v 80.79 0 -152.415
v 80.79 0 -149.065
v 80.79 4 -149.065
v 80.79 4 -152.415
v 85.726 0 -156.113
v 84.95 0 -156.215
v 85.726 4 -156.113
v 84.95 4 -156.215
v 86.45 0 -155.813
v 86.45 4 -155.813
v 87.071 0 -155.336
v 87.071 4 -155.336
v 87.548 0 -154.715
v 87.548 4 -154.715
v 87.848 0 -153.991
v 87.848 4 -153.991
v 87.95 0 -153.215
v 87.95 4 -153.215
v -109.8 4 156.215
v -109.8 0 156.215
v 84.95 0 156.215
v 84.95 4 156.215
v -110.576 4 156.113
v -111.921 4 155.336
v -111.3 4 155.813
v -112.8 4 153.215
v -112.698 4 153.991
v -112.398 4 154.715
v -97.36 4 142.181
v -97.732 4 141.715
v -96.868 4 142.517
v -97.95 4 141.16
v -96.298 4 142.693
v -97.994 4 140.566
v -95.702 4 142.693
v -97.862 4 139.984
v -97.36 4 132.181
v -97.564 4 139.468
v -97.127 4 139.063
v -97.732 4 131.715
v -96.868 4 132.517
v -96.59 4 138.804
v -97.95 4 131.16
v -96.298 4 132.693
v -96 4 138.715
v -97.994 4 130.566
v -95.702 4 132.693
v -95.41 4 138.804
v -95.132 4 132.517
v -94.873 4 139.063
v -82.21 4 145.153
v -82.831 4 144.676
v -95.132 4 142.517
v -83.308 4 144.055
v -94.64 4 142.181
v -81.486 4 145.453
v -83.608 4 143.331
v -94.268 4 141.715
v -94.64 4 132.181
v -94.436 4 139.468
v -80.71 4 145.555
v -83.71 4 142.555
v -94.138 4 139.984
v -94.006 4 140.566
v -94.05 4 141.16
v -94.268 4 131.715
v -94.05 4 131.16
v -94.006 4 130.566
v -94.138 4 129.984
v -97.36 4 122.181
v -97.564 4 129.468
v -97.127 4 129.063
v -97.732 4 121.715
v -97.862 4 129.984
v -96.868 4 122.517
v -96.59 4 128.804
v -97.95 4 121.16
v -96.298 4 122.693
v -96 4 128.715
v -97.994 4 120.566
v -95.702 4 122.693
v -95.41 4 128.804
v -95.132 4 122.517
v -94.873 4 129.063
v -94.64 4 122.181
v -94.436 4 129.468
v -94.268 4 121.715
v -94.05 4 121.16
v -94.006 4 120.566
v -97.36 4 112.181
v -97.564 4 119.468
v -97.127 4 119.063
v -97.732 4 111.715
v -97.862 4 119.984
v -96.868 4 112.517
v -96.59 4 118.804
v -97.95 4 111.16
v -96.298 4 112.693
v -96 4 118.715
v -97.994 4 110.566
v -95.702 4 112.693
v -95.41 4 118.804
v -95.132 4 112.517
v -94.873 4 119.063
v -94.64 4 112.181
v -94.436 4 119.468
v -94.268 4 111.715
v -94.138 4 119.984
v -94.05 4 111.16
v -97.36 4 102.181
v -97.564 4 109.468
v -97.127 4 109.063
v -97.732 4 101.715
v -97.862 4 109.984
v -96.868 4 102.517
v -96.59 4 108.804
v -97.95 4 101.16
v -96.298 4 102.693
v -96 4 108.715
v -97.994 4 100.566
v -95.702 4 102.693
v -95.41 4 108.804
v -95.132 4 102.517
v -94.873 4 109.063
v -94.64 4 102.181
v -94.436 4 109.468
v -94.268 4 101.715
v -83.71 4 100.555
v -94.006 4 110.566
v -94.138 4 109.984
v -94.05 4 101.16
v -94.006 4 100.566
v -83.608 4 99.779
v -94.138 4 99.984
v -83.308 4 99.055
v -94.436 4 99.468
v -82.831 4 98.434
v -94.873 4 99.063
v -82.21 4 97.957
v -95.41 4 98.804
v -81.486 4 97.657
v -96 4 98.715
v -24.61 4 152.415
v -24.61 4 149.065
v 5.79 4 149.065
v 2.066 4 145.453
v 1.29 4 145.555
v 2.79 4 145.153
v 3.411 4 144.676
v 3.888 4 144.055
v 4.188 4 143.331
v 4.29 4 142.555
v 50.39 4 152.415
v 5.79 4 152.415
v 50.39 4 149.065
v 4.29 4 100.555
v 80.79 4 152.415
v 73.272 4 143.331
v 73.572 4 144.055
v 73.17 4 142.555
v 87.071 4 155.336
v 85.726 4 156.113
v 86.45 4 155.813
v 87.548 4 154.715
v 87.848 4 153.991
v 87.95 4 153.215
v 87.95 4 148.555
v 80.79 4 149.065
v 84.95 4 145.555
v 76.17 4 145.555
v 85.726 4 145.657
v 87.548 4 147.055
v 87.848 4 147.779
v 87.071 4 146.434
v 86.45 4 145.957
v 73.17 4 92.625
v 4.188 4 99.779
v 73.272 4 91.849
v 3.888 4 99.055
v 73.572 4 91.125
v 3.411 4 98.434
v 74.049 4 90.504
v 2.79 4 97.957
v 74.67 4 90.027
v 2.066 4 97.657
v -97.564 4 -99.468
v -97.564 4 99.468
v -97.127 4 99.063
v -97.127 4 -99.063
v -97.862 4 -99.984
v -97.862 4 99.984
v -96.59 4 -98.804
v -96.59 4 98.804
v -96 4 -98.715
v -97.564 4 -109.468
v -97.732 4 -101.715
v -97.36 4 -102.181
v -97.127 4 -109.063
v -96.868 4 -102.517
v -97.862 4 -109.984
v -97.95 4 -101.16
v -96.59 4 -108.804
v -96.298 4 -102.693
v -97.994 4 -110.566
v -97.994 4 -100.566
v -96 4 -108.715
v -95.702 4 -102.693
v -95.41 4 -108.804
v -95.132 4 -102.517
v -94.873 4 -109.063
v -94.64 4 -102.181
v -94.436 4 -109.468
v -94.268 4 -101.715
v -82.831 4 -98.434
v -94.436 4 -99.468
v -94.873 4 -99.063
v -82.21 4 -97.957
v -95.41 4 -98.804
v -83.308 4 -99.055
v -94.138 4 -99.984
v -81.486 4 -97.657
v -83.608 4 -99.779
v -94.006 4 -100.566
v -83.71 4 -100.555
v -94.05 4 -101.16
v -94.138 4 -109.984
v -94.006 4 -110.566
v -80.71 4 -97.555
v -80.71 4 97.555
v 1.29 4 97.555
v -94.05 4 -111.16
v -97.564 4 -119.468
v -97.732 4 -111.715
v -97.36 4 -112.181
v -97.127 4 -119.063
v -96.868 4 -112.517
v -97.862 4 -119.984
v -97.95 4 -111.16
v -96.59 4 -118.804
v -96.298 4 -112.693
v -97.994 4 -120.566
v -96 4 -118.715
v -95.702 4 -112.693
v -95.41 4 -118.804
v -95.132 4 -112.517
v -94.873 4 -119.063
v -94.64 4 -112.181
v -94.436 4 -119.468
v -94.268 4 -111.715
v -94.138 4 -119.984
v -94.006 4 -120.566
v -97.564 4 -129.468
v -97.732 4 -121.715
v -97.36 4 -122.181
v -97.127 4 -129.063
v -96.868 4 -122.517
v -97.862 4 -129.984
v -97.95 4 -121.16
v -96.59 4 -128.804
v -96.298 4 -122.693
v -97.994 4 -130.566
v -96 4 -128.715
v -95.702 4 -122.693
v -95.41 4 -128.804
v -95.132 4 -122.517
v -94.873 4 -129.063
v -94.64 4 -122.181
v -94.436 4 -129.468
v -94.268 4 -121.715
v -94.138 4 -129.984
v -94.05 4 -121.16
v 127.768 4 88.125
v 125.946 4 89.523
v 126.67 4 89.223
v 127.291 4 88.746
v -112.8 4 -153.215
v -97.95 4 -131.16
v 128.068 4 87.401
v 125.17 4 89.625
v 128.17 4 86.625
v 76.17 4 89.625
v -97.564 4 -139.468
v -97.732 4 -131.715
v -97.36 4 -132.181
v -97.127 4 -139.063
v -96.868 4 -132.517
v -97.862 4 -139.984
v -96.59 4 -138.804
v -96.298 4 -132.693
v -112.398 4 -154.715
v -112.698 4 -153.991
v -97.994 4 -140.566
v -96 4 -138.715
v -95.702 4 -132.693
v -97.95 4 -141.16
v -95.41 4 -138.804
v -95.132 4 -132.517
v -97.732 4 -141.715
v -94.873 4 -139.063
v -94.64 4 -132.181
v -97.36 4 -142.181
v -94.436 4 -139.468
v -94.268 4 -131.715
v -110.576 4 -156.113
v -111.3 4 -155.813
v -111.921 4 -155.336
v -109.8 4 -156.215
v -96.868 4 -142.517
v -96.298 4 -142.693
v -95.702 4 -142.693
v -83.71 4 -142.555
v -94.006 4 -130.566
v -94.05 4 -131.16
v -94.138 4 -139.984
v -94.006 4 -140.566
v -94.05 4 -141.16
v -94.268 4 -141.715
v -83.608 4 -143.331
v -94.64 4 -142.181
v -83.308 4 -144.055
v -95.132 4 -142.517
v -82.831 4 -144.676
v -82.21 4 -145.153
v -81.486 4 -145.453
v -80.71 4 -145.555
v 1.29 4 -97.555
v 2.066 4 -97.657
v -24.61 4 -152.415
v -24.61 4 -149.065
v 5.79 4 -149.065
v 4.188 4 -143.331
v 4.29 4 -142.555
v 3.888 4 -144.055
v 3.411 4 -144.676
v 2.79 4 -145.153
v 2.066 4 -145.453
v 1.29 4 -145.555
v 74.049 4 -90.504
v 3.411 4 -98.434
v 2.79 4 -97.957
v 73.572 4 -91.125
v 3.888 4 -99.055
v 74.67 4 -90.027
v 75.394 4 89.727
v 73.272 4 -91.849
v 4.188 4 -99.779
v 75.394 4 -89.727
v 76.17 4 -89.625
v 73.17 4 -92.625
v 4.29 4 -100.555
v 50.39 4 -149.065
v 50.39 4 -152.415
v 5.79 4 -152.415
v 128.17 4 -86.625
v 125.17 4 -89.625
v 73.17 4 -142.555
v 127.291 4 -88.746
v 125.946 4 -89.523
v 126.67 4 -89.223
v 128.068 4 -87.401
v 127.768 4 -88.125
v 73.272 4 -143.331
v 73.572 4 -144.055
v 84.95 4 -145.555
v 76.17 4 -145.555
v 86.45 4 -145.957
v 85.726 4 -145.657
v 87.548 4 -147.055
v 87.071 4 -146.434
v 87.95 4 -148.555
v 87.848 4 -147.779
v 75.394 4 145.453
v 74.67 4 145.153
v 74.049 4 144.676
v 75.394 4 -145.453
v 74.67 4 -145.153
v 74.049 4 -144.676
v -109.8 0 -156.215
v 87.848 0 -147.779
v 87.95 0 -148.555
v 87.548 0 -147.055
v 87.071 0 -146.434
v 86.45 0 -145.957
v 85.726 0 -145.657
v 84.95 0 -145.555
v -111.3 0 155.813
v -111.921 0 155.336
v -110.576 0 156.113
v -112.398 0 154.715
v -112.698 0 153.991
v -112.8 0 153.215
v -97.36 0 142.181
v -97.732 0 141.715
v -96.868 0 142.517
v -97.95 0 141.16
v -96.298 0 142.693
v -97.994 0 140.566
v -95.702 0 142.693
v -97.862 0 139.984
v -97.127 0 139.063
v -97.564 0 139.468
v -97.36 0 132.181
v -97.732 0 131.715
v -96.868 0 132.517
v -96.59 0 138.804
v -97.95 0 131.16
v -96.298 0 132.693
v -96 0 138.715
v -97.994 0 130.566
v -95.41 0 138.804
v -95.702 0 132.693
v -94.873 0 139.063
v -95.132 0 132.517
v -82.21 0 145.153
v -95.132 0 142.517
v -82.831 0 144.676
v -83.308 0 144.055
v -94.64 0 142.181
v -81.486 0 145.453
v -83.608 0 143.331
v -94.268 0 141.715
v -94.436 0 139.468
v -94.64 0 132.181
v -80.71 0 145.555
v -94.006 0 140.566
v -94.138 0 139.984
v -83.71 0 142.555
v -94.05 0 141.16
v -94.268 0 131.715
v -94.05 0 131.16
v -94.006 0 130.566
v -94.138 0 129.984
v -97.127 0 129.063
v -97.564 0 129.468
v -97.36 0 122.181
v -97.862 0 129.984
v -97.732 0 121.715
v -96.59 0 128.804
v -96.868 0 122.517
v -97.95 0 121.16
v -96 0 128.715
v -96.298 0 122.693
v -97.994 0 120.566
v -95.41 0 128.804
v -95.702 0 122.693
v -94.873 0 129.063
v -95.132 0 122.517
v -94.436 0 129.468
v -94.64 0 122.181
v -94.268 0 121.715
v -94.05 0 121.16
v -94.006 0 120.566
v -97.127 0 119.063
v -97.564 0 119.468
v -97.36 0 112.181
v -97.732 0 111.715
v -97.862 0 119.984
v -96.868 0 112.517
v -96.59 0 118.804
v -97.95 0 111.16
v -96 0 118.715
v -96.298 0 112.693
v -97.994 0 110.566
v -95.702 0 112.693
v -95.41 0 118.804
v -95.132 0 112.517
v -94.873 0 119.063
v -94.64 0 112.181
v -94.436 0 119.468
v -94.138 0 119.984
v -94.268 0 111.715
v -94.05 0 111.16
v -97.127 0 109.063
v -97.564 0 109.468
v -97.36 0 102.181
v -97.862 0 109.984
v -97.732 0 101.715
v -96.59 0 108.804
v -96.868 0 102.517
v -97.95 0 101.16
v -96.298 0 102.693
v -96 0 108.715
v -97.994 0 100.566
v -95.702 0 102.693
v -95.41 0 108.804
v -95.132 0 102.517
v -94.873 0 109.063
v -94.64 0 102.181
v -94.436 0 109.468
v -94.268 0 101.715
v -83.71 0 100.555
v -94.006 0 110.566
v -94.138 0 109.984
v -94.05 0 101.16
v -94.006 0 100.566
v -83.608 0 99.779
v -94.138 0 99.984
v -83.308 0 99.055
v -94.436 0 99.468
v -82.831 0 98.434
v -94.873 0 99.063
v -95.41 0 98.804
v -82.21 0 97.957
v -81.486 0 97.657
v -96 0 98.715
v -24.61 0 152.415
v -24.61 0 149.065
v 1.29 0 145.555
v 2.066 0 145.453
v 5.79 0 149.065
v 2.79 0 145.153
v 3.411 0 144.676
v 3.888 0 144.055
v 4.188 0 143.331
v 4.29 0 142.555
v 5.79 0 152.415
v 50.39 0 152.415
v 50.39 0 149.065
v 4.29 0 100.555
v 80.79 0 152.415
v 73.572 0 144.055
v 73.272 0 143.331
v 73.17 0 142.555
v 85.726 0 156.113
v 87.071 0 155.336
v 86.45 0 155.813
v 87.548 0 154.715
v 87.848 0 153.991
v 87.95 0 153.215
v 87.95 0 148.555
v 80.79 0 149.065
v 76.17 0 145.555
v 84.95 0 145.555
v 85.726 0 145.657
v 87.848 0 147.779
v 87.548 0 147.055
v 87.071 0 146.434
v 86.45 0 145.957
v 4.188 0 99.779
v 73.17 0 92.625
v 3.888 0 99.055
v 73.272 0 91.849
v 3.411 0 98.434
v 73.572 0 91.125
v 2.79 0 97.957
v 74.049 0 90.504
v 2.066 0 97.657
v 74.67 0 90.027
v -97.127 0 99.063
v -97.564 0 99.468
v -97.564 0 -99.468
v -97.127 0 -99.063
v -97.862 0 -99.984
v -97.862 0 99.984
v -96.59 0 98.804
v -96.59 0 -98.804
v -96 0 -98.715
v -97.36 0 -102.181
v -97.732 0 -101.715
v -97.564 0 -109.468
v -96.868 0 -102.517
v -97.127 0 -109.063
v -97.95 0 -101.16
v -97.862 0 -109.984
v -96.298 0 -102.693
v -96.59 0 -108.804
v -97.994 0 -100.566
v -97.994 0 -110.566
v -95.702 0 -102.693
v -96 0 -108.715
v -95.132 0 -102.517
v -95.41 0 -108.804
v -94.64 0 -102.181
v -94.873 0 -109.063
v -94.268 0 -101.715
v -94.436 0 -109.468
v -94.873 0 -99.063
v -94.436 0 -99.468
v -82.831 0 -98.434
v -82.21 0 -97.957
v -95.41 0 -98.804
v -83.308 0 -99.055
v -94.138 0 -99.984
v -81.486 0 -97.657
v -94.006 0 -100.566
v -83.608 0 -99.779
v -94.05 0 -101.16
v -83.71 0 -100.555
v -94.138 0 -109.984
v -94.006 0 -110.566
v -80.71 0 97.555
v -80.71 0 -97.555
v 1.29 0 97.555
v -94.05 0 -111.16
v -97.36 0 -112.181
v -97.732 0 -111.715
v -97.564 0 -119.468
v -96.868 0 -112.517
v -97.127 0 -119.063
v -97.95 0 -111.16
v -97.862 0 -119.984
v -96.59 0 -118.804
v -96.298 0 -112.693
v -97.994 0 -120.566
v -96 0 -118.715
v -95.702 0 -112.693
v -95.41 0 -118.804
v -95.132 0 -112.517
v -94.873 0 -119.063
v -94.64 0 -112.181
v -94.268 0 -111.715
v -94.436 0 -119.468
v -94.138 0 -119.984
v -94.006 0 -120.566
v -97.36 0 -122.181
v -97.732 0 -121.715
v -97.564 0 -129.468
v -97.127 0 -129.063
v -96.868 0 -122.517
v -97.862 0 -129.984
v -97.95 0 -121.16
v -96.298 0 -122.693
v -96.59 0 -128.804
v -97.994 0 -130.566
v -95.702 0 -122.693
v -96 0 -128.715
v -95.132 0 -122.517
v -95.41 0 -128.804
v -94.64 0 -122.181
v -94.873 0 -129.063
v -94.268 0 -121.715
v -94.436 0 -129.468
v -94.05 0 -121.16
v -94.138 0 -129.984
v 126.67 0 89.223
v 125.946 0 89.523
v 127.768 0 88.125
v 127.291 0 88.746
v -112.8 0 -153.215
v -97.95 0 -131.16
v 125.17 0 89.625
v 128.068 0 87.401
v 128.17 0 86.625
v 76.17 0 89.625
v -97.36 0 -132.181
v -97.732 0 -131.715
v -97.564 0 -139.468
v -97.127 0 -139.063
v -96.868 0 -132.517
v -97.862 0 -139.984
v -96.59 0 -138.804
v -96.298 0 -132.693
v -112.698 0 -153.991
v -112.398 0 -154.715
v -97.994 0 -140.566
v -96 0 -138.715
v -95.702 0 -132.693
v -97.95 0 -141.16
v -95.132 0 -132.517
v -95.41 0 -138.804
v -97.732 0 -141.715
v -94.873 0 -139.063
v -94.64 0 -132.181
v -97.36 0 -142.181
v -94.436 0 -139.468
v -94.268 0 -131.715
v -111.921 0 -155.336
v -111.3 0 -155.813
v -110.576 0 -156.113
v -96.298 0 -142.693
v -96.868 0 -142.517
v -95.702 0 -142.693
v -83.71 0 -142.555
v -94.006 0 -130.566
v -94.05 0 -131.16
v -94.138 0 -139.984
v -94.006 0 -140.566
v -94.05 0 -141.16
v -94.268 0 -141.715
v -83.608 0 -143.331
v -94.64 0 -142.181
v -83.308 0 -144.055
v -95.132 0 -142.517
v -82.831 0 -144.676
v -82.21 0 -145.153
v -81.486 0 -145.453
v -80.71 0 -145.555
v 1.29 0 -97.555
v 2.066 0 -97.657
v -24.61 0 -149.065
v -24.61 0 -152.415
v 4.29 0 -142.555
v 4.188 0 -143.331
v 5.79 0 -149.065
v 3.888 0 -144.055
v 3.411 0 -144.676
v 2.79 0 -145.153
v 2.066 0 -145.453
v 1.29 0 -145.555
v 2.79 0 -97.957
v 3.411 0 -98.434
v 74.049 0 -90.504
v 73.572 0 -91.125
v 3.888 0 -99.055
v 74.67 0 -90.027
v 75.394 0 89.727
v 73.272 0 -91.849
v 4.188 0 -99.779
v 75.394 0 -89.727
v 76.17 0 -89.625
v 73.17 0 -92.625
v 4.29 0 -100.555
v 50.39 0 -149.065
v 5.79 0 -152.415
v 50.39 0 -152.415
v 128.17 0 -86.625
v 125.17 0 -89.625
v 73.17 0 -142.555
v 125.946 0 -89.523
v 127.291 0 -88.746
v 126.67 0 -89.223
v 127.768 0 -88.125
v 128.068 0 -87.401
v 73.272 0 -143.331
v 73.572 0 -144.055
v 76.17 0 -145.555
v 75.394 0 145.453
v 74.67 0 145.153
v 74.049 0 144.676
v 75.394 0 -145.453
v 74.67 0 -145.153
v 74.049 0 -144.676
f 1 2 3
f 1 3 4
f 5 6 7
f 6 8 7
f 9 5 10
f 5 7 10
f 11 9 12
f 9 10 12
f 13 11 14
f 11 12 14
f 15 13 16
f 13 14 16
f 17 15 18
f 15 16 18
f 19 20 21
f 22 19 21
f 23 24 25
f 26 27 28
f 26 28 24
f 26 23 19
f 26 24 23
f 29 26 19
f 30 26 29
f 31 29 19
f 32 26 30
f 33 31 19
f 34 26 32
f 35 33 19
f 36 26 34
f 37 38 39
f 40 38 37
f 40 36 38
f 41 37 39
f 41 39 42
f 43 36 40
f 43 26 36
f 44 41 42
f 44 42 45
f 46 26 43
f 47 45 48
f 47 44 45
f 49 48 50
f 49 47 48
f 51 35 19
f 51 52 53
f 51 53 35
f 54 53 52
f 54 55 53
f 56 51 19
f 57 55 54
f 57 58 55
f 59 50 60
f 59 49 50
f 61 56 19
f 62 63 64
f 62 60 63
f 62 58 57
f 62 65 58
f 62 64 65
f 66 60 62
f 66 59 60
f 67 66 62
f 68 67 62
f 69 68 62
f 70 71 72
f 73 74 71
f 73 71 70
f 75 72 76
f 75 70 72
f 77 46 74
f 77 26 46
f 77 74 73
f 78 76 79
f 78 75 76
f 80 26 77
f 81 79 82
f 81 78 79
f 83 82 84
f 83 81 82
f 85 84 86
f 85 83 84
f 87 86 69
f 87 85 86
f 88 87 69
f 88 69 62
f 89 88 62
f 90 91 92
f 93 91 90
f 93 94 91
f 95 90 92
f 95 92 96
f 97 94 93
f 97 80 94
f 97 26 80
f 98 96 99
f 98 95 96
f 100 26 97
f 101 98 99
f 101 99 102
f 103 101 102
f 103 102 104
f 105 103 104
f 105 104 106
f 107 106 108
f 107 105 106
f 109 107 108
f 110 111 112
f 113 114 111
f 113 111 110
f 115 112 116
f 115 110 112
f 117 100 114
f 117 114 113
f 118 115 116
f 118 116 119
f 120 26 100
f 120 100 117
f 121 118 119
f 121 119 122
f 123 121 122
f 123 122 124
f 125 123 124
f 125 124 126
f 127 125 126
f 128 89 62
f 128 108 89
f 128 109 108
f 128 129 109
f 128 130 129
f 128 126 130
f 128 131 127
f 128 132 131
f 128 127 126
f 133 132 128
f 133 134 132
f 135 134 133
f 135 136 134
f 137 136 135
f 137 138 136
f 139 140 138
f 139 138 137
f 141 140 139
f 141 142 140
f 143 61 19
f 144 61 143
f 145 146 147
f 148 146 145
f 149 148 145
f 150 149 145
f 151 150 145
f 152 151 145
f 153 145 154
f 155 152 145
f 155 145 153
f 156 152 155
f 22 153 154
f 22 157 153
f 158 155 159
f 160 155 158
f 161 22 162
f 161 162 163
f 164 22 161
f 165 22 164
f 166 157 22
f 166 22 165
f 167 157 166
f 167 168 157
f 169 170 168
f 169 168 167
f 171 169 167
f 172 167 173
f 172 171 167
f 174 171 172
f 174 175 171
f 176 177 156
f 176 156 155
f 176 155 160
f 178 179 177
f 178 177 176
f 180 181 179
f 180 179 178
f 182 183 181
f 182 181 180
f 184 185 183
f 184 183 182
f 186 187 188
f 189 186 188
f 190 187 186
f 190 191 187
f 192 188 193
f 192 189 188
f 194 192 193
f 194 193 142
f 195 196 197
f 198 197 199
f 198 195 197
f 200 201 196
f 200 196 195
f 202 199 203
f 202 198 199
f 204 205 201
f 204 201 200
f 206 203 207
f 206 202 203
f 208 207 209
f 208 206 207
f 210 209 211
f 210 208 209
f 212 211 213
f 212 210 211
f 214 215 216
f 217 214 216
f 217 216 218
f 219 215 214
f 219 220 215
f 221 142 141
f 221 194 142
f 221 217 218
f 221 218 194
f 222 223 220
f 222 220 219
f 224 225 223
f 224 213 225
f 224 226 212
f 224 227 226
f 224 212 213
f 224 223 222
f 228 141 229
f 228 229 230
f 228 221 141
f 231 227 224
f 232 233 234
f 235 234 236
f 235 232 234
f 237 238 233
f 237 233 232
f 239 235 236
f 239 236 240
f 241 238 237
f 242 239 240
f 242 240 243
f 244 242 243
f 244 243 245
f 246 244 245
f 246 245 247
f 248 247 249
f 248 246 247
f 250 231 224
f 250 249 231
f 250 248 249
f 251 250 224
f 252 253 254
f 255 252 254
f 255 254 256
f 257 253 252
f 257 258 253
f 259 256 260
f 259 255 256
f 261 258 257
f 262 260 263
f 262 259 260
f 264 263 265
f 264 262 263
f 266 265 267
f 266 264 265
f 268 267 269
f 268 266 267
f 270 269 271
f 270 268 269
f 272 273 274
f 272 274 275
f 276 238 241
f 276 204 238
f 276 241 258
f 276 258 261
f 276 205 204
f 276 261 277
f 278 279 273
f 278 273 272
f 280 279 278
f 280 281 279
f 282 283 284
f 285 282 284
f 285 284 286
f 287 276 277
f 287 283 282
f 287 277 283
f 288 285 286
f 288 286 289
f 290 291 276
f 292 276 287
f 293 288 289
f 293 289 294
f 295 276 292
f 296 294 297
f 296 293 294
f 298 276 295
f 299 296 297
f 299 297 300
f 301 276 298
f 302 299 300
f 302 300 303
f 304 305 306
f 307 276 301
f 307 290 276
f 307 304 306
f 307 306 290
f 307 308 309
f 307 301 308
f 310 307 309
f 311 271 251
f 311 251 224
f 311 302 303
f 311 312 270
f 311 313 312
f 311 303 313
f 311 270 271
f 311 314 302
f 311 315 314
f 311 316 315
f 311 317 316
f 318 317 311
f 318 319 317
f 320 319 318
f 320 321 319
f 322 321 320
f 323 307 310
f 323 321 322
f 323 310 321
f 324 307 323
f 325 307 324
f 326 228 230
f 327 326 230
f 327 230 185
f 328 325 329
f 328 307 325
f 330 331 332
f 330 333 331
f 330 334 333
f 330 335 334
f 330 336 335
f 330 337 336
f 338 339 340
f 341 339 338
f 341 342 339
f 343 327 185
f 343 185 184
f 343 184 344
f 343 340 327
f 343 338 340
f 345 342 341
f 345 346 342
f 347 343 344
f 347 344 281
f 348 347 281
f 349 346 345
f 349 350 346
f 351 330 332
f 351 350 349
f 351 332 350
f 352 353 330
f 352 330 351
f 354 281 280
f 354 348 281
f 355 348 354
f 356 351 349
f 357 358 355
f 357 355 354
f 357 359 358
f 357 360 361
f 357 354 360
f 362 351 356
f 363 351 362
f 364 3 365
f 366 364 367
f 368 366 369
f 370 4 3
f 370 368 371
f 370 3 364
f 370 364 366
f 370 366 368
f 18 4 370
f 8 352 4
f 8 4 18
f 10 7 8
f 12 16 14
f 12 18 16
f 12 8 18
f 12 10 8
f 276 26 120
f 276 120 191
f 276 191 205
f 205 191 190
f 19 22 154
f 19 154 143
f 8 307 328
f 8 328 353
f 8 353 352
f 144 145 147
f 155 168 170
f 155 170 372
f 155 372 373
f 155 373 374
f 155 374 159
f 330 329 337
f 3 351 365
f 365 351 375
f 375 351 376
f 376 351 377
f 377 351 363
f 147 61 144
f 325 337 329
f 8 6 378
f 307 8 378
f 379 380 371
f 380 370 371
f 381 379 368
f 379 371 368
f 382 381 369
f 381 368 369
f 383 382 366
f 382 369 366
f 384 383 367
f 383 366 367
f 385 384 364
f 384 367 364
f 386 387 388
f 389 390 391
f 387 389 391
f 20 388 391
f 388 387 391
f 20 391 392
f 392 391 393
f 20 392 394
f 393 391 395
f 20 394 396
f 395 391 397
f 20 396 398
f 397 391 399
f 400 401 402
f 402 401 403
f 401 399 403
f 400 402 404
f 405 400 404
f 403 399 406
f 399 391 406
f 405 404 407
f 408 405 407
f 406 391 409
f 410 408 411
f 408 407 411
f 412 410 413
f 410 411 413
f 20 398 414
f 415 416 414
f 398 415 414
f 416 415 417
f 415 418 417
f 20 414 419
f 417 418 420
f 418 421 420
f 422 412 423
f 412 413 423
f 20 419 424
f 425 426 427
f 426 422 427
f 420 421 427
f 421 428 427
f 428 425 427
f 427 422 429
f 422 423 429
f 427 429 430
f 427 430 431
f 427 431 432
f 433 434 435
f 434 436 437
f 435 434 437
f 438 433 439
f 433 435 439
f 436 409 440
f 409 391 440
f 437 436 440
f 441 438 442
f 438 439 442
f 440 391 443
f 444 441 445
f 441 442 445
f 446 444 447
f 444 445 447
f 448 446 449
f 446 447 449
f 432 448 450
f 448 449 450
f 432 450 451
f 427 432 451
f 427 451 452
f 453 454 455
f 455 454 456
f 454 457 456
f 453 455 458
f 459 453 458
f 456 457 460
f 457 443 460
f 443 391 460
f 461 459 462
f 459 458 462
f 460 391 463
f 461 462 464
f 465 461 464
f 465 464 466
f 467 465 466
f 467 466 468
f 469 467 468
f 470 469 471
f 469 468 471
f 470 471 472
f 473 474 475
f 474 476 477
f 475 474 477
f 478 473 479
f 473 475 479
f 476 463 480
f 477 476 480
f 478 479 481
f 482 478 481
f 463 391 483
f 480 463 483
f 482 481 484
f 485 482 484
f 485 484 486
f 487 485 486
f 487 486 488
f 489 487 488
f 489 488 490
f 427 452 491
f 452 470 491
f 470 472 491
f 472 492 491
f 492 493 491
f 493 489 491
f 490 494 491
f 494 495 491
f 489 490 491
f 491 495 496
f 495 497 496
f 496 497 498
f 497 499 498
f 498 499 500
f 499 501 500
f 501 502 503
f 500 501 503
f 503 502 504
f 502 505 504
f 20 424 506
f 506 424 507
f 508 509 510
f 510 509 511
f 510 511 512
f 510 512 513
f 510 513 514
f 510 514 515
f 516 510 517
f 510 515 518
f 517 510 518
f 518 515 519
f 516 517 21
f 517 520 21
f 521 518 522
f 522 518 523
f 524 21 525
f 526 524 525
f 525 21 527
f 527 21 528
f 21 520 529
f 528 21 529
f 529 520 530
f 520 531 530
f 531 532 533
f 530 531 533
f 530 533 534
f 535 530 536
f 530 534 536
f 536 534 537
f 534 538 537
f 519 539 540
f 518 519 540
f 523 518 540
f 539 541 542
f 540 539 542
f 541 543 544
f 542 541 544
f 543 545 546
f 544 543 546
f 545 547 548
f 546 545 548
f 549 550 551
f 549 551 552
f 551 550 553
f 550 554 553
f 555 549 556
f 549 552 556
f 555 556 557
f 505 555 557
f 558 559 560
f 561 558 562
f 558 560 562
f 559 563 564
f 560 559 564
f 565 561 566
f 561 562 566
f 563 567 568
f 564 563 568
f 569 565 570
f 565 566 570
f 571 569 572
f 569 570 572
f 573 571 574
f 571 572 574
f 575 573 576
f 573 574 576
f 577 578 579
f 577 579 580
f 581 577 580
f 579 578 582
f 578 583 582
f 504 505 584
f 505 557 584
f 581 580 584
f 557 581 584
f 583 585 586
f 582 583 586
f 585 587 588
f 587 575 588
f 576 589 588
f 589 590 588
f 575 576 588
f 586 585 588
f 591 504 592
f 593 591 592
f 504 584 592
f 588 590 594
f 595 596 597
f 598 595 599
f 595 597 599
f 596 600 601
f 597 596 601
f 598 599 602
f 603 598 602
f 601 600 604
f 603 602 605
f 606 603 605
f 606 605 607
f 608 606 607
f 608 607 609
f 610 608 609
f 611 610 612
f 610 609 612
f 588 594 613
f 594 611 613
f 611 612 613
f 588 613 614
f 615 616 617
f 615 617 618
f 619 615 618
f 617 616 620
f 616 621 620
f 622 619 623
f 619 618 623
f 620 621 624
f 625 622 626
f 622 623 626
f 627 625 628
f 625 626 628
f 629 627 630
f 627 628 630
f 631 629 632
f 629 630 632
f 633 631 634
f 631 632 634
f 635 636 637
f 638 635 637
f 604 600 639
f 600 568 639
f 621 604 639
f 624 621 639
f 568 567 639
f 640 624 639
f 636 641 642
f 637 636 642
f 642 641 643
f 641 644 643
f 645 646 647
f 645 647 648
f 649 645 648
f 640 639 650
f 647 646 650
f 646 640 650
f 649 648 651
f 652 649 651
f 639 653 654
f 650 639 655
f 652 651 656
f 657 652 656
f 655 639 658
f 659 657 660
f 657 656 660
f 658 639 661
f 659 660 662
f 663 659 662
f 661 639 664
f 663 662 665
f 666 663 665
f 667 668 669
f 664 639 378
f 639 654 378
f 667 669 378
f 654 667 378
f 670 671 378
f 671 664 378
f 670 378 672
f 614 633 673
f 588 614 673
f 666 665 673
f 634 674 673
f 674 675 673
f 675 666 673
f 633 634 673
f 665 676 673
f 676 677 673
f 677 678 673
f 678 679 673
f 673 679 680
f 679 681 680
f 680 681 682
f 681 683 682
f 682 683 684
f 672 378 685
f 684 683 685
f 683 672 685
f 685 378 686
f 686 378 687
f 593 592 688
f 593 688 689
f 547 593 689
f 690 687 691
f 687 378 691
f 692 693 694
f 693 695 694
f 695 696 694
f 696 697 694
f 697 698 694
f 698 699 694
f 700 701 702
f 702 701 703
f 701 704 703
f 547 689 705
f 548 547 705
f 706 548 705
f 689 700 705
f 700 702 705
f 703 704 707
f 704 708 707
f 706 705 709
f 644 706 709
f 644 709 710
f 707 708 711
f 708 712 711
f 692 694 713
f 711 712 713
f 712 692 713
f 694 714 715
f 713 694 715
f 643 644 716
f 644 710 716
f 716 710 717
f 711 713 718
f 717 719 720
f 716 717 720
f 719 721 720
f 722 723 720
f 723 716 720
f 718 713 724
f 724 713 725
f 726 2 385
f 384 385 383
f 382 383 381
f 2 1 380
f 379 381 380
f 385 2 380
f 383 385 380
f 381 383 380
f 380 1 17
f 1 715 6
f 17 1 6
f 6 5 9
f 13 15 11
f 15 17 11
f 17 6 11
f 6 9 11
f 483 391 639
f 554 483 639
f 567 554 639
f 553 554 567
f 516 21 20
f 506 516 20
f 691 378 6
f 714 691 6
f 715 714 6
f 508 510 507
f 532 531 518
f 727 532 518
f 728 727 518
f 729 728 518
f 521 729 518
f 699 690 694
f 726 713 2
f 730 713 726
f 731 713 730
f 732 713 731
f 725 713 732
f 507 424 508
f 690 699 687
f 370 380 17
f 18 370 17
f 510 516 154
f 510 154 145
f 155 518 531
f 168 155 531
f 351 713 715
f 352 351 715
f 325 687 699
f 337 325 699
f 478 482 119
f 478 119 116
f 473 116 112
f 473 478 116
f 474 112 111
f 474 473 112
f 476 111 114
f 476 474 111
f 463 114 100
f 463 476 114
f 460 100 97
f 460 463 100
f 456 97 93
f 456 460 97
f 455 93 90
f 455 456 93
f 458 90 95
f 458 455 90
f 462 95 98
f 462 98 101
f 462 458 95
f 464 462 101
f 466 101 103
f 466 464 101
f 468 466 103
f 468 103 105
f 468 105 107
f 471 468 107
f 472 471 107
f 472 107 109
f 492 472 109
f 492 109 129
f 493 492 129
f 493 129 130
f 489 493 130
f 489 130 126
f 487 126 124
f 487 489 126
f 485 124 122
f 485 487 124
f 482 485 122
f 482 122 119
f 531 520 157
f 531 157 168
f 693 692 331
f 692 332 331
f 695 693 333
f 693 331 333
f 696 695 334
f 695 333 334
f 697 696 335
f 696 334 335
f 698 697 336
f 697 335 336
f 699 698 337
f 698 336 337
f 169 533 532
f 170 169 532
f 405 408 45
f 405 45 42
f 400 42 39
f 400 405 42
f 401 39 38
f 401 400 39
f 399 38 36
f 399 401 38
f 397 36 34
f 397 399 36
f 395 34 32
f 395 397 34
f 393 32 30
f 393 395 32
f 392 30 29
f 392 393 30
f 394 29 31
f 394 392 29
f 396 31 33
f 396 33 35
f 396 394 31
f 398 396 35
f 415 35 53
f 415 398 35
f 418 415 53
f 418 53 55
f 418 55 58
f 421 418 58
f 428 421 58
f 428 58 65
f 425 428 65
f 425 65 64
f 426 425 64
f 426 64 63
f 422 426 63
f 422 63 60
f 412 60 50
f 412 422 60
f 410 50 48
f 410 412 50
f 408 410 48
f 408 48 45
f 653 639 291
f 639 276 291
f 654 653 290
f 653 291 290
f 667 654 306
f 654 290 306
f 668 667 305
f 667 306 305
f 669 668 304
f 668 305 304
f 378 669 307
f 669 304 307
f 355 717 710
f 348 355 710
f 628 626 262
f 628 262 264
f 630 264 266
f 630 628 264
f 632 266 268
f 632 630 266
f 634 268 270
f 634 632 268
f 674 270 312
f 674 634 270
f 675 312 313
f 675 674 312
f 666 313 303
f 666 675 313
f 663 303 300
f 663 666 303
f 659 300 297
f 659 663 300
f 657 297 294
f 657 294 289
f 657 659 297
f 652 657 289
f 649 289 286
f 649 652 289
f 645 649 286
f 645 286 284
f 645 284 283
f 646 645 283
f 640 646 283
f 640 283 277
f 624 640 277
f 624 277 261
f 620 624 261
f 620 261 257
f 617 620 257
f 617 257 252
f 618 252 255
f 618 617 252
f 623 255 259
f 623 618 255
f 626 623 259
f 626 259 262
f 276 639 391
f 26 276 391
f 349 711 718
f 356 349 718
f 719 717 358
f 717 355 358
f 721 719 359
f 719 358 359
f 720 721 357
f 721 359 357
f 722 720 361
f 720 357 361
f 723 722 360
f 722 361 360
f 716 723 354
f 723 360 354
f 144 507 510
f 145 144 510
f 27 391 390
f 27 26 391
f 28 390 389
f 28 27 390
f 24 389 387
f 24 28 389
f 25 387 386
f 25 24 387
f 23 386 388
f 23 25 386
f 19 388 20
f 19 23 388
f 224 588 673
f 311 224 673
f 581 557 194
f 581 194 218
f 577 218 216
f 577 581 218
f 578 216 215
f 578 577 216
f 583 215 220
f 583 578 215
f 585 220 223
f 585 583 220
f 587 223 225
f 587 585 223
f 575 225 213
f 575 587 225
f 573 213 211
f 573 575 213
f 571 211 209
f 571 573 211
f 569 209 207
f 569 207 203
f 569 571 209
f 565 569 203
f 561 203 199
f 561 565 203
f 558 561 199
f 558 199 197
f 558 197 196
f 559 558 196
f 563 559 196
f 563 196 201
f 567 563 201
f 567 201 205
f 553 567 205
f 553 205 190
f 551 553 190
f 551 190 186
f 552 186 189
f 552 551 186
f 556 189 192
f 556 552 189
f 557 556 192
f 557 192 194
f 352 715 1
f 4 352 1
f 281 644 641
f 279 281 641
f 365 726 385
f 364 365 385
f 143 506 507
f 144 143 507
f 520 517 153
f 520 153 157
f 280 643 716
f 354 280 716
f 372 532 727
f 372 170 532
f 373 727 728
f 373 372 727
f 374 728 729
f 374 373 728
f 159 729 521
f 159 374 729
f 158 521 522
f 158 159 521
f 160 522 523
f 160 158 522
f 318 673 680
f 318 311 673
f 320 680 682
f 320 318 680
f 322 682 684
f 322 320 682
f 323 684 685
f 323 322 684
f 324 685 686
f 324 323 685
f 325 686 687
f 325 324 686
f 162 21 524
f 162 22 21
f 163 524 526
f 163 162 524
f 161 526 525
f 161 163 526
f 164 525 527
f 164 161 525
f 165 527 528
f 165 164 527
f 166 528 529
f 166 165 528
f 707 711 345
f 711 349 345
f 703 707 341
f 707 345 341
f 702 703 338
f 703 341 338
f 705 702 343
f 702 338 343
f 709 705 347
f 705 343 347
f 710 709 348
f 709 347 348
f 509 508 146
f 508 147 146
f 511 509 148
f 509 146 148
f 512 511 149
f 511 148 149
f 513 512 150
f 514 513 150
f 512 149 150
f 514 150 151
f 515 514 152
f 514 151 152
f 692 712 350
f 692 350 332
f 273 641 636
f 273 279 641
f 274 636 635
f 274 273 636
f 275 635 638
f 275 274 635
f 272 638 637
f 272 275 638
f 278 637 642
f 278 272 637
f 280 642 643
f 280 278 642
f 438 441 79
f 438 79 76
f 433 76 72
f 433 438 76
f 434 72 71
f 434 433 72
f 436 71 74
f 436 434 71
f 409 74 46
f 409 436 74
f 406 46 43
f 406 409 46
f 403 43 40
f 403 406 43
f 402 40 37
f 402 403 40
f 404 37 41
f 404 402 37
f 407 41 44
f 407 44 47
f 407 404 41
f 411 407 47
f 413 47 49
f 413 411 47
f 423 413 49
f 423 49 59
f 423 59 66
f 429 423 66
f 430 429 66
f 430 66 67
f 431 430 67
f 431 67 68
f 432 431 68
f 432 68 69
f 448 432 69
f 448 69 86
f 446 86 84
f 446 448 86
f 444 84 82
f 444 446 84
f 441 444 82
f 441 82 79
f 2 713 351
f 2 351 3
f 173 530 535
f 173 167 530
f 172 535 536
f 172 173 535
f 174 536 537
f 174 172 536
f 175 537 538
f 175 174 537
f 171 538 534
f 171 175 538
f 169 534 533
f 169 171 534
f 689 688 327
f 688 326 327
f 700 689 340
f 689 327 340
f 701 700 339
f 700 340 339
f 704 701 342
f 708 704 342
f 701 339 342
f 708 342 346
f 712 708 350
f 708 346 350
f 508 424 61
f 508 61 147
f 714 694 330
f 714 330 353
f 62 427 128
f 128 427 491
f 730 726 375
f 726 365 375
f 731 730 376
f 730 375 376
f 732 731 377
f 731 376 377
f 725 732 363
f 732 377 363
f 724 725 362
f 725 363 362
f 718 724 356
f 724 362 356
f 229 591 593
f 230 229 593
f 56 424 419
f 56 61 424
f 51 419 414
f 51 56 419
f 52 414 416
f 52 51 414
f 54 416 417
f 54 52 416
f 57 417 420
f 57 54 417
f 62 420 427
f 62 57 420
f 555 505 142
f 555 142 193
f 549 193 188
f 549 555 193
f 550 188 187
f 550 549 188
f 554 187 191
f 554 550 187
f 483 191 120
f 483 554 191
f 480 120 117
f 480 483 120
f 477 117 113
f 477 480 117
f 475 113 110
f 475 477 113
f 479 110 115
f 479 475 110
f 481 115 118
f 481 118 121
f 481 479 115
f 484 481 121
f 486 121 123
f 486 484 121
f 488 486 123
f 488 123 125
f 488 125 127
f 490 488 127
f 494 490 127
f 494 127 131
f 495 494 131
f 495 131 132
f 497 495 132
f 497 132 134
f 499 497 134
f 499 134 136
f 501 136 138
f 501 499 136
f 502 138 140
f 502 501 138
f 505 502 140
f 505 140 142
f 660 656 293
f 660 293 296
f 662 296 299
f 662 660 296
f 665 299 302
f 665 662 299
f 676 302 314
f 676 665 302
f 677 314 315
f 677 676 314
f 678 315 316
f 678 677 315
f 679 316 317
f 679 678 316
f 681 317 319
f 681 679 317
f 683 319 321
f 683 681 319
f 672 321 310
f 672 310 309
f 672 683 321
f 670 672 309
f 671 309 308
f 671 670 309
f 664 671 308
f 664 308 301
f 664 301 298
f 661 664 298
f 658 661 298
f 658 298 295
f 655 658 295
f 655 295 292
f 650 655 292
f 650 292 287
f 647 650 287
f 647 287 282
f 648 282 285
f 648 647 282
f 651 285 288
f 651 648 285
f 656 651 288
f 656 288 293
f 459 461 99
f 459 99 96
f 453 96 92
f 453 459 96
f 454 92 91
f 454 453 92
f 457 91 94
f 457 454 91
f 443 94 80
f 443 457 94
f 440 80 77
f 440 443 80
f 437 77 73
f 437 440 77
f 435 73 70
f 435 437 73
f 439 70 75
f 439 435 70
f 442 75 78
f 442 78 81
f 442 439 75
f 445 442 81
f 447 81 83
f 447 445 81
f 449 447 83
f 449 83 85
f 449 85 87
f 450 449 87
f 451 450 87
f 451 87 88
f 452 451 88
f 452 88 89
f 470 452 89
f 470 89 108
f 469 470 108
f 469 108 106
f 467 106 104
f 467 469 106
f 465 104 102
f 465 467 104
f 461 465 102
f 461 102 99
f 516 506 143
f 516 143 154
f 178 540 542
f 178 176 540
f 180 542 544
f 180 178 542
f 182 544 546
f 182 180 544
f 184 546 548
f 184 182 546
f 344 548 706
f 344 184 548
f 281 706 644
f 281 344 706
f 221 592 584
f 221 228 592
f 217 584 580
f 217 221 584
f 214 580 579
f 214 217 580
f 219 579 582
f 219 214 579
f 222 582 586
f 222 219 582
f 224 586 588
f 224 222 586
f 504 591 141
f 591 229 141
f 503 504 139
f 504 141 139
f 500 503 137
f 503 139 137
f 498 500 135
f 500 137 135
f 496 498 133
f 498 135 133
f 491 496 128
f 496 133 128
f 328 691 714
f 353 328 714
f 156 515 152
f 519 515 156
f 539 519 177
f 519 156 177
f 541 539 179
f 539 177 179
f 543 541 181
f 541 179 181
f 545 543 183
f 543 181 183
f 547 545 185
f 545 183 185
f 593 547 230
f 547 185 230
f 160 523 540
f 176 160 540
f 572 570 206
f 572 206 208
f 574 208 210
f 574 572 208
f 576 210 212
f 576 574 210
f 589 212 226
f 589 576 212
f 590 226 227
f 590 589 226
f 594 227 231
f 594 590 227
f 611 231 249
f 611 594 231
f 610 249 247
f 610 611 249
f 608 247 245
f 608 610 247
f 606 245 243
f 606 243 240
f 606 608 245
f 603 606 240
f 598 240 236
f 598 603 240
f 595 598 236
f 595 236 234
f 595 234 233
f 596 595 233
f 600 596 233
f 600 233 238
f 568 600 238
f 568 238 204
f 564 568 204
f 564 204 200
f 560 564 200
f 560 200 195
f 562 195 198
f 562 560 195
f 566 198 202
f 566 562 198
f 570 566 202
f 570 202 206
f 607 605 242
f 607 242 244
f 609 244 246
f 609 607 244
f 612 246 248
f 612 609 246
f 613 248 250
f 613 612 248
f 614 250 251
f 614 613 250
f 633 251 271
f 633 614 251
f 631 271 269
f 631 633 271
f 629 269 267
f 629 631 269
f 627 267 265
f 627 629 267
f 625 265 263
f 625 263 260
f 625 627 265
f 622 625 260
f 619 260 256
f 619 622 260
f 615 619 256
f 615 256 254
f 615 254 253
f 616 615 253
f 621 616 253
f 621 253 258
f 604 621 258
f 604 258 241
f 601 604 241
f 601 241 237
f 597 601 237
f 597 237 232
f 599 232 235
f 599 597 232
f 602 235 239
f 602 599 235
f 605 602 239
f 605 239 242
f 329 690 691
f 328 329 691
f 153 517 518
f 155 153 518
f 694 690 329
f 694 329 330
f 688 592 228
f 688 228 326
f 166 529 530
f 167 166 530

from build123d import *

# Parameters (mm, degrees)
SKETCH1_R           = 2
SKETCH1_W           = 30.4
SKETCH1_H           = 3.35
SKETCH1_W_2         = 88
SKETCH1_H_2         = 48
BOSS_EXTRUDE1_DEPTH = 4
FILLET1_R           = 3


with BuildPart() as part:
    # Sketch1 → Boss-Extrude1 (new body)
    with BuildSketch(Plane(origin=(0, 0, 0), x_dir=(1, 0, 0), z_dir=(0, 1, 0))):
        Polygon((-112.8, 156.215), (-112.8, -156.215), (87.95, -156.215), (87.95, -145.555), (73.17, -145.555), (73.17, -89.625), (128.17, -89.625), (128.17, 89.625), (73.17, 89.625), (73.17, 145.555), (87.95, 145.555), (87.95, 156.215), align=None)
        with Locations(Location((-96, 140.715, 0), (0, 0, 270))):
            Circle(SKETCH1_R, mode=Mode.SUBTRACT)
        with Locations(Location((-96, 130.715, 0), (0, 0, 270))):
            Circle(SKETCH1_R, mode=Mode.SUBTRACT)
        with Locations(Location((-96, 120.715, 0), (0, 0, 270))):
            Circle(SKETCH1_R, mode=Mode.SUBTRACT)
        with Locations(Location((-96, 110.715, 0), (0, 0, 270))):
            Circle(SKETCH1_R, mode=Mode.SUBTRACT)
        with Locations(Location((-96, 100.715, 0), (0, 0, 270))):
            Circle(SKETCH1_R, mode=Mode.SUBTRACT)
        with Locations(Location((-96, -100.715, 0), (0, 0, 90))):
            Circle(SKETCH1_R, mode=Mode.SUBTRACT)
        with Locations(Location((-96, -110.715, 0), (0, 0, 90))):
            Circle(SKETCH1_R, mode=Mode.SUBTRACT)
        with Locations(Location((-96, -120.715, 0), (0, 0, 90))):
            Circle(SKETCH1_R, mode=Mode.SUBTRACT)
        with Locations(Location((-96, -130.715, 0), (0, 0, 90))):
            Circle(SKETCH1_R, mode=Mode.SUBTRACT)
        with Locations(Location((-96, -140.715, 0), (0, 0, 90))):
            Circle(SKETCH1_R, mode=Mode.SUBTRACT)
        with Locations((65.59, 150.74)):
            Rectangle(SKETCH1_W, SKETCH1_H, mode=Mode.SUBTRACT)
        with Locations((-39.71, 121.555)):
            Rectangle(SKETCH1_W_2, SKETCH1_H_2, mode=Mode.SUBTRACT)
        with Locations((-9.41, 150.74)):
            Rectangle(SKETCH1_W, SKETCH1_H, mode=Mode.SUBTRACT)
        with Locations((65.59, -150.74)):
            Rectangle(SKETCH1_W, SKETCH1_H, mode=Mode.SUBTRACT)
        with Locations((-9.41, -150.74)):
            Rectangle(SKETCH1_W, SKETCH1_H, mode=Mode.SUBTRACT)
        with Locations((-39.71, -121.555)):
            Rectangle(SKETCH1_W_2, SKETCH1_H_2, mode=Mode.SUBTRACT)
    extrude(amount=BOSS_EXTRUDE1_DEPTH)

    # Fillet1
    fillet1_edges = [part.edges().sort_by_distance(p)[0] for p in [
        (-83.71, 2, 97.555),
        (-83.71, 2, 145.555),
        (4.29, 2, 145.555),
        (4.29, 2, 97.555),
        (87.95, 2, -156.215),
        (87.95, 2, -145.555),
        (73.17, 2, -145.555),
        (73.17, 2, -89.625),
        (128.17, 2, -89.625),
        (128.17, 2, 89.625),
        (73.17, 2, 89.625),
        (73.17, 2, 145.555),
        (87.95, 2, 145.555),
        (87.95, 2, 156.215),
        (-112.8, 2, 156.215),
        (-112.8, 2, -156.215),
        (-83.71, 2, -145.555),
        (-83.71, 2, -97.555),
        (4.29, 2, -97.555),
        (4.29, 2, -145.555),
    ]]
    fillet(fillet1_edges, radius=FILLET1_R)


solid = part.part
